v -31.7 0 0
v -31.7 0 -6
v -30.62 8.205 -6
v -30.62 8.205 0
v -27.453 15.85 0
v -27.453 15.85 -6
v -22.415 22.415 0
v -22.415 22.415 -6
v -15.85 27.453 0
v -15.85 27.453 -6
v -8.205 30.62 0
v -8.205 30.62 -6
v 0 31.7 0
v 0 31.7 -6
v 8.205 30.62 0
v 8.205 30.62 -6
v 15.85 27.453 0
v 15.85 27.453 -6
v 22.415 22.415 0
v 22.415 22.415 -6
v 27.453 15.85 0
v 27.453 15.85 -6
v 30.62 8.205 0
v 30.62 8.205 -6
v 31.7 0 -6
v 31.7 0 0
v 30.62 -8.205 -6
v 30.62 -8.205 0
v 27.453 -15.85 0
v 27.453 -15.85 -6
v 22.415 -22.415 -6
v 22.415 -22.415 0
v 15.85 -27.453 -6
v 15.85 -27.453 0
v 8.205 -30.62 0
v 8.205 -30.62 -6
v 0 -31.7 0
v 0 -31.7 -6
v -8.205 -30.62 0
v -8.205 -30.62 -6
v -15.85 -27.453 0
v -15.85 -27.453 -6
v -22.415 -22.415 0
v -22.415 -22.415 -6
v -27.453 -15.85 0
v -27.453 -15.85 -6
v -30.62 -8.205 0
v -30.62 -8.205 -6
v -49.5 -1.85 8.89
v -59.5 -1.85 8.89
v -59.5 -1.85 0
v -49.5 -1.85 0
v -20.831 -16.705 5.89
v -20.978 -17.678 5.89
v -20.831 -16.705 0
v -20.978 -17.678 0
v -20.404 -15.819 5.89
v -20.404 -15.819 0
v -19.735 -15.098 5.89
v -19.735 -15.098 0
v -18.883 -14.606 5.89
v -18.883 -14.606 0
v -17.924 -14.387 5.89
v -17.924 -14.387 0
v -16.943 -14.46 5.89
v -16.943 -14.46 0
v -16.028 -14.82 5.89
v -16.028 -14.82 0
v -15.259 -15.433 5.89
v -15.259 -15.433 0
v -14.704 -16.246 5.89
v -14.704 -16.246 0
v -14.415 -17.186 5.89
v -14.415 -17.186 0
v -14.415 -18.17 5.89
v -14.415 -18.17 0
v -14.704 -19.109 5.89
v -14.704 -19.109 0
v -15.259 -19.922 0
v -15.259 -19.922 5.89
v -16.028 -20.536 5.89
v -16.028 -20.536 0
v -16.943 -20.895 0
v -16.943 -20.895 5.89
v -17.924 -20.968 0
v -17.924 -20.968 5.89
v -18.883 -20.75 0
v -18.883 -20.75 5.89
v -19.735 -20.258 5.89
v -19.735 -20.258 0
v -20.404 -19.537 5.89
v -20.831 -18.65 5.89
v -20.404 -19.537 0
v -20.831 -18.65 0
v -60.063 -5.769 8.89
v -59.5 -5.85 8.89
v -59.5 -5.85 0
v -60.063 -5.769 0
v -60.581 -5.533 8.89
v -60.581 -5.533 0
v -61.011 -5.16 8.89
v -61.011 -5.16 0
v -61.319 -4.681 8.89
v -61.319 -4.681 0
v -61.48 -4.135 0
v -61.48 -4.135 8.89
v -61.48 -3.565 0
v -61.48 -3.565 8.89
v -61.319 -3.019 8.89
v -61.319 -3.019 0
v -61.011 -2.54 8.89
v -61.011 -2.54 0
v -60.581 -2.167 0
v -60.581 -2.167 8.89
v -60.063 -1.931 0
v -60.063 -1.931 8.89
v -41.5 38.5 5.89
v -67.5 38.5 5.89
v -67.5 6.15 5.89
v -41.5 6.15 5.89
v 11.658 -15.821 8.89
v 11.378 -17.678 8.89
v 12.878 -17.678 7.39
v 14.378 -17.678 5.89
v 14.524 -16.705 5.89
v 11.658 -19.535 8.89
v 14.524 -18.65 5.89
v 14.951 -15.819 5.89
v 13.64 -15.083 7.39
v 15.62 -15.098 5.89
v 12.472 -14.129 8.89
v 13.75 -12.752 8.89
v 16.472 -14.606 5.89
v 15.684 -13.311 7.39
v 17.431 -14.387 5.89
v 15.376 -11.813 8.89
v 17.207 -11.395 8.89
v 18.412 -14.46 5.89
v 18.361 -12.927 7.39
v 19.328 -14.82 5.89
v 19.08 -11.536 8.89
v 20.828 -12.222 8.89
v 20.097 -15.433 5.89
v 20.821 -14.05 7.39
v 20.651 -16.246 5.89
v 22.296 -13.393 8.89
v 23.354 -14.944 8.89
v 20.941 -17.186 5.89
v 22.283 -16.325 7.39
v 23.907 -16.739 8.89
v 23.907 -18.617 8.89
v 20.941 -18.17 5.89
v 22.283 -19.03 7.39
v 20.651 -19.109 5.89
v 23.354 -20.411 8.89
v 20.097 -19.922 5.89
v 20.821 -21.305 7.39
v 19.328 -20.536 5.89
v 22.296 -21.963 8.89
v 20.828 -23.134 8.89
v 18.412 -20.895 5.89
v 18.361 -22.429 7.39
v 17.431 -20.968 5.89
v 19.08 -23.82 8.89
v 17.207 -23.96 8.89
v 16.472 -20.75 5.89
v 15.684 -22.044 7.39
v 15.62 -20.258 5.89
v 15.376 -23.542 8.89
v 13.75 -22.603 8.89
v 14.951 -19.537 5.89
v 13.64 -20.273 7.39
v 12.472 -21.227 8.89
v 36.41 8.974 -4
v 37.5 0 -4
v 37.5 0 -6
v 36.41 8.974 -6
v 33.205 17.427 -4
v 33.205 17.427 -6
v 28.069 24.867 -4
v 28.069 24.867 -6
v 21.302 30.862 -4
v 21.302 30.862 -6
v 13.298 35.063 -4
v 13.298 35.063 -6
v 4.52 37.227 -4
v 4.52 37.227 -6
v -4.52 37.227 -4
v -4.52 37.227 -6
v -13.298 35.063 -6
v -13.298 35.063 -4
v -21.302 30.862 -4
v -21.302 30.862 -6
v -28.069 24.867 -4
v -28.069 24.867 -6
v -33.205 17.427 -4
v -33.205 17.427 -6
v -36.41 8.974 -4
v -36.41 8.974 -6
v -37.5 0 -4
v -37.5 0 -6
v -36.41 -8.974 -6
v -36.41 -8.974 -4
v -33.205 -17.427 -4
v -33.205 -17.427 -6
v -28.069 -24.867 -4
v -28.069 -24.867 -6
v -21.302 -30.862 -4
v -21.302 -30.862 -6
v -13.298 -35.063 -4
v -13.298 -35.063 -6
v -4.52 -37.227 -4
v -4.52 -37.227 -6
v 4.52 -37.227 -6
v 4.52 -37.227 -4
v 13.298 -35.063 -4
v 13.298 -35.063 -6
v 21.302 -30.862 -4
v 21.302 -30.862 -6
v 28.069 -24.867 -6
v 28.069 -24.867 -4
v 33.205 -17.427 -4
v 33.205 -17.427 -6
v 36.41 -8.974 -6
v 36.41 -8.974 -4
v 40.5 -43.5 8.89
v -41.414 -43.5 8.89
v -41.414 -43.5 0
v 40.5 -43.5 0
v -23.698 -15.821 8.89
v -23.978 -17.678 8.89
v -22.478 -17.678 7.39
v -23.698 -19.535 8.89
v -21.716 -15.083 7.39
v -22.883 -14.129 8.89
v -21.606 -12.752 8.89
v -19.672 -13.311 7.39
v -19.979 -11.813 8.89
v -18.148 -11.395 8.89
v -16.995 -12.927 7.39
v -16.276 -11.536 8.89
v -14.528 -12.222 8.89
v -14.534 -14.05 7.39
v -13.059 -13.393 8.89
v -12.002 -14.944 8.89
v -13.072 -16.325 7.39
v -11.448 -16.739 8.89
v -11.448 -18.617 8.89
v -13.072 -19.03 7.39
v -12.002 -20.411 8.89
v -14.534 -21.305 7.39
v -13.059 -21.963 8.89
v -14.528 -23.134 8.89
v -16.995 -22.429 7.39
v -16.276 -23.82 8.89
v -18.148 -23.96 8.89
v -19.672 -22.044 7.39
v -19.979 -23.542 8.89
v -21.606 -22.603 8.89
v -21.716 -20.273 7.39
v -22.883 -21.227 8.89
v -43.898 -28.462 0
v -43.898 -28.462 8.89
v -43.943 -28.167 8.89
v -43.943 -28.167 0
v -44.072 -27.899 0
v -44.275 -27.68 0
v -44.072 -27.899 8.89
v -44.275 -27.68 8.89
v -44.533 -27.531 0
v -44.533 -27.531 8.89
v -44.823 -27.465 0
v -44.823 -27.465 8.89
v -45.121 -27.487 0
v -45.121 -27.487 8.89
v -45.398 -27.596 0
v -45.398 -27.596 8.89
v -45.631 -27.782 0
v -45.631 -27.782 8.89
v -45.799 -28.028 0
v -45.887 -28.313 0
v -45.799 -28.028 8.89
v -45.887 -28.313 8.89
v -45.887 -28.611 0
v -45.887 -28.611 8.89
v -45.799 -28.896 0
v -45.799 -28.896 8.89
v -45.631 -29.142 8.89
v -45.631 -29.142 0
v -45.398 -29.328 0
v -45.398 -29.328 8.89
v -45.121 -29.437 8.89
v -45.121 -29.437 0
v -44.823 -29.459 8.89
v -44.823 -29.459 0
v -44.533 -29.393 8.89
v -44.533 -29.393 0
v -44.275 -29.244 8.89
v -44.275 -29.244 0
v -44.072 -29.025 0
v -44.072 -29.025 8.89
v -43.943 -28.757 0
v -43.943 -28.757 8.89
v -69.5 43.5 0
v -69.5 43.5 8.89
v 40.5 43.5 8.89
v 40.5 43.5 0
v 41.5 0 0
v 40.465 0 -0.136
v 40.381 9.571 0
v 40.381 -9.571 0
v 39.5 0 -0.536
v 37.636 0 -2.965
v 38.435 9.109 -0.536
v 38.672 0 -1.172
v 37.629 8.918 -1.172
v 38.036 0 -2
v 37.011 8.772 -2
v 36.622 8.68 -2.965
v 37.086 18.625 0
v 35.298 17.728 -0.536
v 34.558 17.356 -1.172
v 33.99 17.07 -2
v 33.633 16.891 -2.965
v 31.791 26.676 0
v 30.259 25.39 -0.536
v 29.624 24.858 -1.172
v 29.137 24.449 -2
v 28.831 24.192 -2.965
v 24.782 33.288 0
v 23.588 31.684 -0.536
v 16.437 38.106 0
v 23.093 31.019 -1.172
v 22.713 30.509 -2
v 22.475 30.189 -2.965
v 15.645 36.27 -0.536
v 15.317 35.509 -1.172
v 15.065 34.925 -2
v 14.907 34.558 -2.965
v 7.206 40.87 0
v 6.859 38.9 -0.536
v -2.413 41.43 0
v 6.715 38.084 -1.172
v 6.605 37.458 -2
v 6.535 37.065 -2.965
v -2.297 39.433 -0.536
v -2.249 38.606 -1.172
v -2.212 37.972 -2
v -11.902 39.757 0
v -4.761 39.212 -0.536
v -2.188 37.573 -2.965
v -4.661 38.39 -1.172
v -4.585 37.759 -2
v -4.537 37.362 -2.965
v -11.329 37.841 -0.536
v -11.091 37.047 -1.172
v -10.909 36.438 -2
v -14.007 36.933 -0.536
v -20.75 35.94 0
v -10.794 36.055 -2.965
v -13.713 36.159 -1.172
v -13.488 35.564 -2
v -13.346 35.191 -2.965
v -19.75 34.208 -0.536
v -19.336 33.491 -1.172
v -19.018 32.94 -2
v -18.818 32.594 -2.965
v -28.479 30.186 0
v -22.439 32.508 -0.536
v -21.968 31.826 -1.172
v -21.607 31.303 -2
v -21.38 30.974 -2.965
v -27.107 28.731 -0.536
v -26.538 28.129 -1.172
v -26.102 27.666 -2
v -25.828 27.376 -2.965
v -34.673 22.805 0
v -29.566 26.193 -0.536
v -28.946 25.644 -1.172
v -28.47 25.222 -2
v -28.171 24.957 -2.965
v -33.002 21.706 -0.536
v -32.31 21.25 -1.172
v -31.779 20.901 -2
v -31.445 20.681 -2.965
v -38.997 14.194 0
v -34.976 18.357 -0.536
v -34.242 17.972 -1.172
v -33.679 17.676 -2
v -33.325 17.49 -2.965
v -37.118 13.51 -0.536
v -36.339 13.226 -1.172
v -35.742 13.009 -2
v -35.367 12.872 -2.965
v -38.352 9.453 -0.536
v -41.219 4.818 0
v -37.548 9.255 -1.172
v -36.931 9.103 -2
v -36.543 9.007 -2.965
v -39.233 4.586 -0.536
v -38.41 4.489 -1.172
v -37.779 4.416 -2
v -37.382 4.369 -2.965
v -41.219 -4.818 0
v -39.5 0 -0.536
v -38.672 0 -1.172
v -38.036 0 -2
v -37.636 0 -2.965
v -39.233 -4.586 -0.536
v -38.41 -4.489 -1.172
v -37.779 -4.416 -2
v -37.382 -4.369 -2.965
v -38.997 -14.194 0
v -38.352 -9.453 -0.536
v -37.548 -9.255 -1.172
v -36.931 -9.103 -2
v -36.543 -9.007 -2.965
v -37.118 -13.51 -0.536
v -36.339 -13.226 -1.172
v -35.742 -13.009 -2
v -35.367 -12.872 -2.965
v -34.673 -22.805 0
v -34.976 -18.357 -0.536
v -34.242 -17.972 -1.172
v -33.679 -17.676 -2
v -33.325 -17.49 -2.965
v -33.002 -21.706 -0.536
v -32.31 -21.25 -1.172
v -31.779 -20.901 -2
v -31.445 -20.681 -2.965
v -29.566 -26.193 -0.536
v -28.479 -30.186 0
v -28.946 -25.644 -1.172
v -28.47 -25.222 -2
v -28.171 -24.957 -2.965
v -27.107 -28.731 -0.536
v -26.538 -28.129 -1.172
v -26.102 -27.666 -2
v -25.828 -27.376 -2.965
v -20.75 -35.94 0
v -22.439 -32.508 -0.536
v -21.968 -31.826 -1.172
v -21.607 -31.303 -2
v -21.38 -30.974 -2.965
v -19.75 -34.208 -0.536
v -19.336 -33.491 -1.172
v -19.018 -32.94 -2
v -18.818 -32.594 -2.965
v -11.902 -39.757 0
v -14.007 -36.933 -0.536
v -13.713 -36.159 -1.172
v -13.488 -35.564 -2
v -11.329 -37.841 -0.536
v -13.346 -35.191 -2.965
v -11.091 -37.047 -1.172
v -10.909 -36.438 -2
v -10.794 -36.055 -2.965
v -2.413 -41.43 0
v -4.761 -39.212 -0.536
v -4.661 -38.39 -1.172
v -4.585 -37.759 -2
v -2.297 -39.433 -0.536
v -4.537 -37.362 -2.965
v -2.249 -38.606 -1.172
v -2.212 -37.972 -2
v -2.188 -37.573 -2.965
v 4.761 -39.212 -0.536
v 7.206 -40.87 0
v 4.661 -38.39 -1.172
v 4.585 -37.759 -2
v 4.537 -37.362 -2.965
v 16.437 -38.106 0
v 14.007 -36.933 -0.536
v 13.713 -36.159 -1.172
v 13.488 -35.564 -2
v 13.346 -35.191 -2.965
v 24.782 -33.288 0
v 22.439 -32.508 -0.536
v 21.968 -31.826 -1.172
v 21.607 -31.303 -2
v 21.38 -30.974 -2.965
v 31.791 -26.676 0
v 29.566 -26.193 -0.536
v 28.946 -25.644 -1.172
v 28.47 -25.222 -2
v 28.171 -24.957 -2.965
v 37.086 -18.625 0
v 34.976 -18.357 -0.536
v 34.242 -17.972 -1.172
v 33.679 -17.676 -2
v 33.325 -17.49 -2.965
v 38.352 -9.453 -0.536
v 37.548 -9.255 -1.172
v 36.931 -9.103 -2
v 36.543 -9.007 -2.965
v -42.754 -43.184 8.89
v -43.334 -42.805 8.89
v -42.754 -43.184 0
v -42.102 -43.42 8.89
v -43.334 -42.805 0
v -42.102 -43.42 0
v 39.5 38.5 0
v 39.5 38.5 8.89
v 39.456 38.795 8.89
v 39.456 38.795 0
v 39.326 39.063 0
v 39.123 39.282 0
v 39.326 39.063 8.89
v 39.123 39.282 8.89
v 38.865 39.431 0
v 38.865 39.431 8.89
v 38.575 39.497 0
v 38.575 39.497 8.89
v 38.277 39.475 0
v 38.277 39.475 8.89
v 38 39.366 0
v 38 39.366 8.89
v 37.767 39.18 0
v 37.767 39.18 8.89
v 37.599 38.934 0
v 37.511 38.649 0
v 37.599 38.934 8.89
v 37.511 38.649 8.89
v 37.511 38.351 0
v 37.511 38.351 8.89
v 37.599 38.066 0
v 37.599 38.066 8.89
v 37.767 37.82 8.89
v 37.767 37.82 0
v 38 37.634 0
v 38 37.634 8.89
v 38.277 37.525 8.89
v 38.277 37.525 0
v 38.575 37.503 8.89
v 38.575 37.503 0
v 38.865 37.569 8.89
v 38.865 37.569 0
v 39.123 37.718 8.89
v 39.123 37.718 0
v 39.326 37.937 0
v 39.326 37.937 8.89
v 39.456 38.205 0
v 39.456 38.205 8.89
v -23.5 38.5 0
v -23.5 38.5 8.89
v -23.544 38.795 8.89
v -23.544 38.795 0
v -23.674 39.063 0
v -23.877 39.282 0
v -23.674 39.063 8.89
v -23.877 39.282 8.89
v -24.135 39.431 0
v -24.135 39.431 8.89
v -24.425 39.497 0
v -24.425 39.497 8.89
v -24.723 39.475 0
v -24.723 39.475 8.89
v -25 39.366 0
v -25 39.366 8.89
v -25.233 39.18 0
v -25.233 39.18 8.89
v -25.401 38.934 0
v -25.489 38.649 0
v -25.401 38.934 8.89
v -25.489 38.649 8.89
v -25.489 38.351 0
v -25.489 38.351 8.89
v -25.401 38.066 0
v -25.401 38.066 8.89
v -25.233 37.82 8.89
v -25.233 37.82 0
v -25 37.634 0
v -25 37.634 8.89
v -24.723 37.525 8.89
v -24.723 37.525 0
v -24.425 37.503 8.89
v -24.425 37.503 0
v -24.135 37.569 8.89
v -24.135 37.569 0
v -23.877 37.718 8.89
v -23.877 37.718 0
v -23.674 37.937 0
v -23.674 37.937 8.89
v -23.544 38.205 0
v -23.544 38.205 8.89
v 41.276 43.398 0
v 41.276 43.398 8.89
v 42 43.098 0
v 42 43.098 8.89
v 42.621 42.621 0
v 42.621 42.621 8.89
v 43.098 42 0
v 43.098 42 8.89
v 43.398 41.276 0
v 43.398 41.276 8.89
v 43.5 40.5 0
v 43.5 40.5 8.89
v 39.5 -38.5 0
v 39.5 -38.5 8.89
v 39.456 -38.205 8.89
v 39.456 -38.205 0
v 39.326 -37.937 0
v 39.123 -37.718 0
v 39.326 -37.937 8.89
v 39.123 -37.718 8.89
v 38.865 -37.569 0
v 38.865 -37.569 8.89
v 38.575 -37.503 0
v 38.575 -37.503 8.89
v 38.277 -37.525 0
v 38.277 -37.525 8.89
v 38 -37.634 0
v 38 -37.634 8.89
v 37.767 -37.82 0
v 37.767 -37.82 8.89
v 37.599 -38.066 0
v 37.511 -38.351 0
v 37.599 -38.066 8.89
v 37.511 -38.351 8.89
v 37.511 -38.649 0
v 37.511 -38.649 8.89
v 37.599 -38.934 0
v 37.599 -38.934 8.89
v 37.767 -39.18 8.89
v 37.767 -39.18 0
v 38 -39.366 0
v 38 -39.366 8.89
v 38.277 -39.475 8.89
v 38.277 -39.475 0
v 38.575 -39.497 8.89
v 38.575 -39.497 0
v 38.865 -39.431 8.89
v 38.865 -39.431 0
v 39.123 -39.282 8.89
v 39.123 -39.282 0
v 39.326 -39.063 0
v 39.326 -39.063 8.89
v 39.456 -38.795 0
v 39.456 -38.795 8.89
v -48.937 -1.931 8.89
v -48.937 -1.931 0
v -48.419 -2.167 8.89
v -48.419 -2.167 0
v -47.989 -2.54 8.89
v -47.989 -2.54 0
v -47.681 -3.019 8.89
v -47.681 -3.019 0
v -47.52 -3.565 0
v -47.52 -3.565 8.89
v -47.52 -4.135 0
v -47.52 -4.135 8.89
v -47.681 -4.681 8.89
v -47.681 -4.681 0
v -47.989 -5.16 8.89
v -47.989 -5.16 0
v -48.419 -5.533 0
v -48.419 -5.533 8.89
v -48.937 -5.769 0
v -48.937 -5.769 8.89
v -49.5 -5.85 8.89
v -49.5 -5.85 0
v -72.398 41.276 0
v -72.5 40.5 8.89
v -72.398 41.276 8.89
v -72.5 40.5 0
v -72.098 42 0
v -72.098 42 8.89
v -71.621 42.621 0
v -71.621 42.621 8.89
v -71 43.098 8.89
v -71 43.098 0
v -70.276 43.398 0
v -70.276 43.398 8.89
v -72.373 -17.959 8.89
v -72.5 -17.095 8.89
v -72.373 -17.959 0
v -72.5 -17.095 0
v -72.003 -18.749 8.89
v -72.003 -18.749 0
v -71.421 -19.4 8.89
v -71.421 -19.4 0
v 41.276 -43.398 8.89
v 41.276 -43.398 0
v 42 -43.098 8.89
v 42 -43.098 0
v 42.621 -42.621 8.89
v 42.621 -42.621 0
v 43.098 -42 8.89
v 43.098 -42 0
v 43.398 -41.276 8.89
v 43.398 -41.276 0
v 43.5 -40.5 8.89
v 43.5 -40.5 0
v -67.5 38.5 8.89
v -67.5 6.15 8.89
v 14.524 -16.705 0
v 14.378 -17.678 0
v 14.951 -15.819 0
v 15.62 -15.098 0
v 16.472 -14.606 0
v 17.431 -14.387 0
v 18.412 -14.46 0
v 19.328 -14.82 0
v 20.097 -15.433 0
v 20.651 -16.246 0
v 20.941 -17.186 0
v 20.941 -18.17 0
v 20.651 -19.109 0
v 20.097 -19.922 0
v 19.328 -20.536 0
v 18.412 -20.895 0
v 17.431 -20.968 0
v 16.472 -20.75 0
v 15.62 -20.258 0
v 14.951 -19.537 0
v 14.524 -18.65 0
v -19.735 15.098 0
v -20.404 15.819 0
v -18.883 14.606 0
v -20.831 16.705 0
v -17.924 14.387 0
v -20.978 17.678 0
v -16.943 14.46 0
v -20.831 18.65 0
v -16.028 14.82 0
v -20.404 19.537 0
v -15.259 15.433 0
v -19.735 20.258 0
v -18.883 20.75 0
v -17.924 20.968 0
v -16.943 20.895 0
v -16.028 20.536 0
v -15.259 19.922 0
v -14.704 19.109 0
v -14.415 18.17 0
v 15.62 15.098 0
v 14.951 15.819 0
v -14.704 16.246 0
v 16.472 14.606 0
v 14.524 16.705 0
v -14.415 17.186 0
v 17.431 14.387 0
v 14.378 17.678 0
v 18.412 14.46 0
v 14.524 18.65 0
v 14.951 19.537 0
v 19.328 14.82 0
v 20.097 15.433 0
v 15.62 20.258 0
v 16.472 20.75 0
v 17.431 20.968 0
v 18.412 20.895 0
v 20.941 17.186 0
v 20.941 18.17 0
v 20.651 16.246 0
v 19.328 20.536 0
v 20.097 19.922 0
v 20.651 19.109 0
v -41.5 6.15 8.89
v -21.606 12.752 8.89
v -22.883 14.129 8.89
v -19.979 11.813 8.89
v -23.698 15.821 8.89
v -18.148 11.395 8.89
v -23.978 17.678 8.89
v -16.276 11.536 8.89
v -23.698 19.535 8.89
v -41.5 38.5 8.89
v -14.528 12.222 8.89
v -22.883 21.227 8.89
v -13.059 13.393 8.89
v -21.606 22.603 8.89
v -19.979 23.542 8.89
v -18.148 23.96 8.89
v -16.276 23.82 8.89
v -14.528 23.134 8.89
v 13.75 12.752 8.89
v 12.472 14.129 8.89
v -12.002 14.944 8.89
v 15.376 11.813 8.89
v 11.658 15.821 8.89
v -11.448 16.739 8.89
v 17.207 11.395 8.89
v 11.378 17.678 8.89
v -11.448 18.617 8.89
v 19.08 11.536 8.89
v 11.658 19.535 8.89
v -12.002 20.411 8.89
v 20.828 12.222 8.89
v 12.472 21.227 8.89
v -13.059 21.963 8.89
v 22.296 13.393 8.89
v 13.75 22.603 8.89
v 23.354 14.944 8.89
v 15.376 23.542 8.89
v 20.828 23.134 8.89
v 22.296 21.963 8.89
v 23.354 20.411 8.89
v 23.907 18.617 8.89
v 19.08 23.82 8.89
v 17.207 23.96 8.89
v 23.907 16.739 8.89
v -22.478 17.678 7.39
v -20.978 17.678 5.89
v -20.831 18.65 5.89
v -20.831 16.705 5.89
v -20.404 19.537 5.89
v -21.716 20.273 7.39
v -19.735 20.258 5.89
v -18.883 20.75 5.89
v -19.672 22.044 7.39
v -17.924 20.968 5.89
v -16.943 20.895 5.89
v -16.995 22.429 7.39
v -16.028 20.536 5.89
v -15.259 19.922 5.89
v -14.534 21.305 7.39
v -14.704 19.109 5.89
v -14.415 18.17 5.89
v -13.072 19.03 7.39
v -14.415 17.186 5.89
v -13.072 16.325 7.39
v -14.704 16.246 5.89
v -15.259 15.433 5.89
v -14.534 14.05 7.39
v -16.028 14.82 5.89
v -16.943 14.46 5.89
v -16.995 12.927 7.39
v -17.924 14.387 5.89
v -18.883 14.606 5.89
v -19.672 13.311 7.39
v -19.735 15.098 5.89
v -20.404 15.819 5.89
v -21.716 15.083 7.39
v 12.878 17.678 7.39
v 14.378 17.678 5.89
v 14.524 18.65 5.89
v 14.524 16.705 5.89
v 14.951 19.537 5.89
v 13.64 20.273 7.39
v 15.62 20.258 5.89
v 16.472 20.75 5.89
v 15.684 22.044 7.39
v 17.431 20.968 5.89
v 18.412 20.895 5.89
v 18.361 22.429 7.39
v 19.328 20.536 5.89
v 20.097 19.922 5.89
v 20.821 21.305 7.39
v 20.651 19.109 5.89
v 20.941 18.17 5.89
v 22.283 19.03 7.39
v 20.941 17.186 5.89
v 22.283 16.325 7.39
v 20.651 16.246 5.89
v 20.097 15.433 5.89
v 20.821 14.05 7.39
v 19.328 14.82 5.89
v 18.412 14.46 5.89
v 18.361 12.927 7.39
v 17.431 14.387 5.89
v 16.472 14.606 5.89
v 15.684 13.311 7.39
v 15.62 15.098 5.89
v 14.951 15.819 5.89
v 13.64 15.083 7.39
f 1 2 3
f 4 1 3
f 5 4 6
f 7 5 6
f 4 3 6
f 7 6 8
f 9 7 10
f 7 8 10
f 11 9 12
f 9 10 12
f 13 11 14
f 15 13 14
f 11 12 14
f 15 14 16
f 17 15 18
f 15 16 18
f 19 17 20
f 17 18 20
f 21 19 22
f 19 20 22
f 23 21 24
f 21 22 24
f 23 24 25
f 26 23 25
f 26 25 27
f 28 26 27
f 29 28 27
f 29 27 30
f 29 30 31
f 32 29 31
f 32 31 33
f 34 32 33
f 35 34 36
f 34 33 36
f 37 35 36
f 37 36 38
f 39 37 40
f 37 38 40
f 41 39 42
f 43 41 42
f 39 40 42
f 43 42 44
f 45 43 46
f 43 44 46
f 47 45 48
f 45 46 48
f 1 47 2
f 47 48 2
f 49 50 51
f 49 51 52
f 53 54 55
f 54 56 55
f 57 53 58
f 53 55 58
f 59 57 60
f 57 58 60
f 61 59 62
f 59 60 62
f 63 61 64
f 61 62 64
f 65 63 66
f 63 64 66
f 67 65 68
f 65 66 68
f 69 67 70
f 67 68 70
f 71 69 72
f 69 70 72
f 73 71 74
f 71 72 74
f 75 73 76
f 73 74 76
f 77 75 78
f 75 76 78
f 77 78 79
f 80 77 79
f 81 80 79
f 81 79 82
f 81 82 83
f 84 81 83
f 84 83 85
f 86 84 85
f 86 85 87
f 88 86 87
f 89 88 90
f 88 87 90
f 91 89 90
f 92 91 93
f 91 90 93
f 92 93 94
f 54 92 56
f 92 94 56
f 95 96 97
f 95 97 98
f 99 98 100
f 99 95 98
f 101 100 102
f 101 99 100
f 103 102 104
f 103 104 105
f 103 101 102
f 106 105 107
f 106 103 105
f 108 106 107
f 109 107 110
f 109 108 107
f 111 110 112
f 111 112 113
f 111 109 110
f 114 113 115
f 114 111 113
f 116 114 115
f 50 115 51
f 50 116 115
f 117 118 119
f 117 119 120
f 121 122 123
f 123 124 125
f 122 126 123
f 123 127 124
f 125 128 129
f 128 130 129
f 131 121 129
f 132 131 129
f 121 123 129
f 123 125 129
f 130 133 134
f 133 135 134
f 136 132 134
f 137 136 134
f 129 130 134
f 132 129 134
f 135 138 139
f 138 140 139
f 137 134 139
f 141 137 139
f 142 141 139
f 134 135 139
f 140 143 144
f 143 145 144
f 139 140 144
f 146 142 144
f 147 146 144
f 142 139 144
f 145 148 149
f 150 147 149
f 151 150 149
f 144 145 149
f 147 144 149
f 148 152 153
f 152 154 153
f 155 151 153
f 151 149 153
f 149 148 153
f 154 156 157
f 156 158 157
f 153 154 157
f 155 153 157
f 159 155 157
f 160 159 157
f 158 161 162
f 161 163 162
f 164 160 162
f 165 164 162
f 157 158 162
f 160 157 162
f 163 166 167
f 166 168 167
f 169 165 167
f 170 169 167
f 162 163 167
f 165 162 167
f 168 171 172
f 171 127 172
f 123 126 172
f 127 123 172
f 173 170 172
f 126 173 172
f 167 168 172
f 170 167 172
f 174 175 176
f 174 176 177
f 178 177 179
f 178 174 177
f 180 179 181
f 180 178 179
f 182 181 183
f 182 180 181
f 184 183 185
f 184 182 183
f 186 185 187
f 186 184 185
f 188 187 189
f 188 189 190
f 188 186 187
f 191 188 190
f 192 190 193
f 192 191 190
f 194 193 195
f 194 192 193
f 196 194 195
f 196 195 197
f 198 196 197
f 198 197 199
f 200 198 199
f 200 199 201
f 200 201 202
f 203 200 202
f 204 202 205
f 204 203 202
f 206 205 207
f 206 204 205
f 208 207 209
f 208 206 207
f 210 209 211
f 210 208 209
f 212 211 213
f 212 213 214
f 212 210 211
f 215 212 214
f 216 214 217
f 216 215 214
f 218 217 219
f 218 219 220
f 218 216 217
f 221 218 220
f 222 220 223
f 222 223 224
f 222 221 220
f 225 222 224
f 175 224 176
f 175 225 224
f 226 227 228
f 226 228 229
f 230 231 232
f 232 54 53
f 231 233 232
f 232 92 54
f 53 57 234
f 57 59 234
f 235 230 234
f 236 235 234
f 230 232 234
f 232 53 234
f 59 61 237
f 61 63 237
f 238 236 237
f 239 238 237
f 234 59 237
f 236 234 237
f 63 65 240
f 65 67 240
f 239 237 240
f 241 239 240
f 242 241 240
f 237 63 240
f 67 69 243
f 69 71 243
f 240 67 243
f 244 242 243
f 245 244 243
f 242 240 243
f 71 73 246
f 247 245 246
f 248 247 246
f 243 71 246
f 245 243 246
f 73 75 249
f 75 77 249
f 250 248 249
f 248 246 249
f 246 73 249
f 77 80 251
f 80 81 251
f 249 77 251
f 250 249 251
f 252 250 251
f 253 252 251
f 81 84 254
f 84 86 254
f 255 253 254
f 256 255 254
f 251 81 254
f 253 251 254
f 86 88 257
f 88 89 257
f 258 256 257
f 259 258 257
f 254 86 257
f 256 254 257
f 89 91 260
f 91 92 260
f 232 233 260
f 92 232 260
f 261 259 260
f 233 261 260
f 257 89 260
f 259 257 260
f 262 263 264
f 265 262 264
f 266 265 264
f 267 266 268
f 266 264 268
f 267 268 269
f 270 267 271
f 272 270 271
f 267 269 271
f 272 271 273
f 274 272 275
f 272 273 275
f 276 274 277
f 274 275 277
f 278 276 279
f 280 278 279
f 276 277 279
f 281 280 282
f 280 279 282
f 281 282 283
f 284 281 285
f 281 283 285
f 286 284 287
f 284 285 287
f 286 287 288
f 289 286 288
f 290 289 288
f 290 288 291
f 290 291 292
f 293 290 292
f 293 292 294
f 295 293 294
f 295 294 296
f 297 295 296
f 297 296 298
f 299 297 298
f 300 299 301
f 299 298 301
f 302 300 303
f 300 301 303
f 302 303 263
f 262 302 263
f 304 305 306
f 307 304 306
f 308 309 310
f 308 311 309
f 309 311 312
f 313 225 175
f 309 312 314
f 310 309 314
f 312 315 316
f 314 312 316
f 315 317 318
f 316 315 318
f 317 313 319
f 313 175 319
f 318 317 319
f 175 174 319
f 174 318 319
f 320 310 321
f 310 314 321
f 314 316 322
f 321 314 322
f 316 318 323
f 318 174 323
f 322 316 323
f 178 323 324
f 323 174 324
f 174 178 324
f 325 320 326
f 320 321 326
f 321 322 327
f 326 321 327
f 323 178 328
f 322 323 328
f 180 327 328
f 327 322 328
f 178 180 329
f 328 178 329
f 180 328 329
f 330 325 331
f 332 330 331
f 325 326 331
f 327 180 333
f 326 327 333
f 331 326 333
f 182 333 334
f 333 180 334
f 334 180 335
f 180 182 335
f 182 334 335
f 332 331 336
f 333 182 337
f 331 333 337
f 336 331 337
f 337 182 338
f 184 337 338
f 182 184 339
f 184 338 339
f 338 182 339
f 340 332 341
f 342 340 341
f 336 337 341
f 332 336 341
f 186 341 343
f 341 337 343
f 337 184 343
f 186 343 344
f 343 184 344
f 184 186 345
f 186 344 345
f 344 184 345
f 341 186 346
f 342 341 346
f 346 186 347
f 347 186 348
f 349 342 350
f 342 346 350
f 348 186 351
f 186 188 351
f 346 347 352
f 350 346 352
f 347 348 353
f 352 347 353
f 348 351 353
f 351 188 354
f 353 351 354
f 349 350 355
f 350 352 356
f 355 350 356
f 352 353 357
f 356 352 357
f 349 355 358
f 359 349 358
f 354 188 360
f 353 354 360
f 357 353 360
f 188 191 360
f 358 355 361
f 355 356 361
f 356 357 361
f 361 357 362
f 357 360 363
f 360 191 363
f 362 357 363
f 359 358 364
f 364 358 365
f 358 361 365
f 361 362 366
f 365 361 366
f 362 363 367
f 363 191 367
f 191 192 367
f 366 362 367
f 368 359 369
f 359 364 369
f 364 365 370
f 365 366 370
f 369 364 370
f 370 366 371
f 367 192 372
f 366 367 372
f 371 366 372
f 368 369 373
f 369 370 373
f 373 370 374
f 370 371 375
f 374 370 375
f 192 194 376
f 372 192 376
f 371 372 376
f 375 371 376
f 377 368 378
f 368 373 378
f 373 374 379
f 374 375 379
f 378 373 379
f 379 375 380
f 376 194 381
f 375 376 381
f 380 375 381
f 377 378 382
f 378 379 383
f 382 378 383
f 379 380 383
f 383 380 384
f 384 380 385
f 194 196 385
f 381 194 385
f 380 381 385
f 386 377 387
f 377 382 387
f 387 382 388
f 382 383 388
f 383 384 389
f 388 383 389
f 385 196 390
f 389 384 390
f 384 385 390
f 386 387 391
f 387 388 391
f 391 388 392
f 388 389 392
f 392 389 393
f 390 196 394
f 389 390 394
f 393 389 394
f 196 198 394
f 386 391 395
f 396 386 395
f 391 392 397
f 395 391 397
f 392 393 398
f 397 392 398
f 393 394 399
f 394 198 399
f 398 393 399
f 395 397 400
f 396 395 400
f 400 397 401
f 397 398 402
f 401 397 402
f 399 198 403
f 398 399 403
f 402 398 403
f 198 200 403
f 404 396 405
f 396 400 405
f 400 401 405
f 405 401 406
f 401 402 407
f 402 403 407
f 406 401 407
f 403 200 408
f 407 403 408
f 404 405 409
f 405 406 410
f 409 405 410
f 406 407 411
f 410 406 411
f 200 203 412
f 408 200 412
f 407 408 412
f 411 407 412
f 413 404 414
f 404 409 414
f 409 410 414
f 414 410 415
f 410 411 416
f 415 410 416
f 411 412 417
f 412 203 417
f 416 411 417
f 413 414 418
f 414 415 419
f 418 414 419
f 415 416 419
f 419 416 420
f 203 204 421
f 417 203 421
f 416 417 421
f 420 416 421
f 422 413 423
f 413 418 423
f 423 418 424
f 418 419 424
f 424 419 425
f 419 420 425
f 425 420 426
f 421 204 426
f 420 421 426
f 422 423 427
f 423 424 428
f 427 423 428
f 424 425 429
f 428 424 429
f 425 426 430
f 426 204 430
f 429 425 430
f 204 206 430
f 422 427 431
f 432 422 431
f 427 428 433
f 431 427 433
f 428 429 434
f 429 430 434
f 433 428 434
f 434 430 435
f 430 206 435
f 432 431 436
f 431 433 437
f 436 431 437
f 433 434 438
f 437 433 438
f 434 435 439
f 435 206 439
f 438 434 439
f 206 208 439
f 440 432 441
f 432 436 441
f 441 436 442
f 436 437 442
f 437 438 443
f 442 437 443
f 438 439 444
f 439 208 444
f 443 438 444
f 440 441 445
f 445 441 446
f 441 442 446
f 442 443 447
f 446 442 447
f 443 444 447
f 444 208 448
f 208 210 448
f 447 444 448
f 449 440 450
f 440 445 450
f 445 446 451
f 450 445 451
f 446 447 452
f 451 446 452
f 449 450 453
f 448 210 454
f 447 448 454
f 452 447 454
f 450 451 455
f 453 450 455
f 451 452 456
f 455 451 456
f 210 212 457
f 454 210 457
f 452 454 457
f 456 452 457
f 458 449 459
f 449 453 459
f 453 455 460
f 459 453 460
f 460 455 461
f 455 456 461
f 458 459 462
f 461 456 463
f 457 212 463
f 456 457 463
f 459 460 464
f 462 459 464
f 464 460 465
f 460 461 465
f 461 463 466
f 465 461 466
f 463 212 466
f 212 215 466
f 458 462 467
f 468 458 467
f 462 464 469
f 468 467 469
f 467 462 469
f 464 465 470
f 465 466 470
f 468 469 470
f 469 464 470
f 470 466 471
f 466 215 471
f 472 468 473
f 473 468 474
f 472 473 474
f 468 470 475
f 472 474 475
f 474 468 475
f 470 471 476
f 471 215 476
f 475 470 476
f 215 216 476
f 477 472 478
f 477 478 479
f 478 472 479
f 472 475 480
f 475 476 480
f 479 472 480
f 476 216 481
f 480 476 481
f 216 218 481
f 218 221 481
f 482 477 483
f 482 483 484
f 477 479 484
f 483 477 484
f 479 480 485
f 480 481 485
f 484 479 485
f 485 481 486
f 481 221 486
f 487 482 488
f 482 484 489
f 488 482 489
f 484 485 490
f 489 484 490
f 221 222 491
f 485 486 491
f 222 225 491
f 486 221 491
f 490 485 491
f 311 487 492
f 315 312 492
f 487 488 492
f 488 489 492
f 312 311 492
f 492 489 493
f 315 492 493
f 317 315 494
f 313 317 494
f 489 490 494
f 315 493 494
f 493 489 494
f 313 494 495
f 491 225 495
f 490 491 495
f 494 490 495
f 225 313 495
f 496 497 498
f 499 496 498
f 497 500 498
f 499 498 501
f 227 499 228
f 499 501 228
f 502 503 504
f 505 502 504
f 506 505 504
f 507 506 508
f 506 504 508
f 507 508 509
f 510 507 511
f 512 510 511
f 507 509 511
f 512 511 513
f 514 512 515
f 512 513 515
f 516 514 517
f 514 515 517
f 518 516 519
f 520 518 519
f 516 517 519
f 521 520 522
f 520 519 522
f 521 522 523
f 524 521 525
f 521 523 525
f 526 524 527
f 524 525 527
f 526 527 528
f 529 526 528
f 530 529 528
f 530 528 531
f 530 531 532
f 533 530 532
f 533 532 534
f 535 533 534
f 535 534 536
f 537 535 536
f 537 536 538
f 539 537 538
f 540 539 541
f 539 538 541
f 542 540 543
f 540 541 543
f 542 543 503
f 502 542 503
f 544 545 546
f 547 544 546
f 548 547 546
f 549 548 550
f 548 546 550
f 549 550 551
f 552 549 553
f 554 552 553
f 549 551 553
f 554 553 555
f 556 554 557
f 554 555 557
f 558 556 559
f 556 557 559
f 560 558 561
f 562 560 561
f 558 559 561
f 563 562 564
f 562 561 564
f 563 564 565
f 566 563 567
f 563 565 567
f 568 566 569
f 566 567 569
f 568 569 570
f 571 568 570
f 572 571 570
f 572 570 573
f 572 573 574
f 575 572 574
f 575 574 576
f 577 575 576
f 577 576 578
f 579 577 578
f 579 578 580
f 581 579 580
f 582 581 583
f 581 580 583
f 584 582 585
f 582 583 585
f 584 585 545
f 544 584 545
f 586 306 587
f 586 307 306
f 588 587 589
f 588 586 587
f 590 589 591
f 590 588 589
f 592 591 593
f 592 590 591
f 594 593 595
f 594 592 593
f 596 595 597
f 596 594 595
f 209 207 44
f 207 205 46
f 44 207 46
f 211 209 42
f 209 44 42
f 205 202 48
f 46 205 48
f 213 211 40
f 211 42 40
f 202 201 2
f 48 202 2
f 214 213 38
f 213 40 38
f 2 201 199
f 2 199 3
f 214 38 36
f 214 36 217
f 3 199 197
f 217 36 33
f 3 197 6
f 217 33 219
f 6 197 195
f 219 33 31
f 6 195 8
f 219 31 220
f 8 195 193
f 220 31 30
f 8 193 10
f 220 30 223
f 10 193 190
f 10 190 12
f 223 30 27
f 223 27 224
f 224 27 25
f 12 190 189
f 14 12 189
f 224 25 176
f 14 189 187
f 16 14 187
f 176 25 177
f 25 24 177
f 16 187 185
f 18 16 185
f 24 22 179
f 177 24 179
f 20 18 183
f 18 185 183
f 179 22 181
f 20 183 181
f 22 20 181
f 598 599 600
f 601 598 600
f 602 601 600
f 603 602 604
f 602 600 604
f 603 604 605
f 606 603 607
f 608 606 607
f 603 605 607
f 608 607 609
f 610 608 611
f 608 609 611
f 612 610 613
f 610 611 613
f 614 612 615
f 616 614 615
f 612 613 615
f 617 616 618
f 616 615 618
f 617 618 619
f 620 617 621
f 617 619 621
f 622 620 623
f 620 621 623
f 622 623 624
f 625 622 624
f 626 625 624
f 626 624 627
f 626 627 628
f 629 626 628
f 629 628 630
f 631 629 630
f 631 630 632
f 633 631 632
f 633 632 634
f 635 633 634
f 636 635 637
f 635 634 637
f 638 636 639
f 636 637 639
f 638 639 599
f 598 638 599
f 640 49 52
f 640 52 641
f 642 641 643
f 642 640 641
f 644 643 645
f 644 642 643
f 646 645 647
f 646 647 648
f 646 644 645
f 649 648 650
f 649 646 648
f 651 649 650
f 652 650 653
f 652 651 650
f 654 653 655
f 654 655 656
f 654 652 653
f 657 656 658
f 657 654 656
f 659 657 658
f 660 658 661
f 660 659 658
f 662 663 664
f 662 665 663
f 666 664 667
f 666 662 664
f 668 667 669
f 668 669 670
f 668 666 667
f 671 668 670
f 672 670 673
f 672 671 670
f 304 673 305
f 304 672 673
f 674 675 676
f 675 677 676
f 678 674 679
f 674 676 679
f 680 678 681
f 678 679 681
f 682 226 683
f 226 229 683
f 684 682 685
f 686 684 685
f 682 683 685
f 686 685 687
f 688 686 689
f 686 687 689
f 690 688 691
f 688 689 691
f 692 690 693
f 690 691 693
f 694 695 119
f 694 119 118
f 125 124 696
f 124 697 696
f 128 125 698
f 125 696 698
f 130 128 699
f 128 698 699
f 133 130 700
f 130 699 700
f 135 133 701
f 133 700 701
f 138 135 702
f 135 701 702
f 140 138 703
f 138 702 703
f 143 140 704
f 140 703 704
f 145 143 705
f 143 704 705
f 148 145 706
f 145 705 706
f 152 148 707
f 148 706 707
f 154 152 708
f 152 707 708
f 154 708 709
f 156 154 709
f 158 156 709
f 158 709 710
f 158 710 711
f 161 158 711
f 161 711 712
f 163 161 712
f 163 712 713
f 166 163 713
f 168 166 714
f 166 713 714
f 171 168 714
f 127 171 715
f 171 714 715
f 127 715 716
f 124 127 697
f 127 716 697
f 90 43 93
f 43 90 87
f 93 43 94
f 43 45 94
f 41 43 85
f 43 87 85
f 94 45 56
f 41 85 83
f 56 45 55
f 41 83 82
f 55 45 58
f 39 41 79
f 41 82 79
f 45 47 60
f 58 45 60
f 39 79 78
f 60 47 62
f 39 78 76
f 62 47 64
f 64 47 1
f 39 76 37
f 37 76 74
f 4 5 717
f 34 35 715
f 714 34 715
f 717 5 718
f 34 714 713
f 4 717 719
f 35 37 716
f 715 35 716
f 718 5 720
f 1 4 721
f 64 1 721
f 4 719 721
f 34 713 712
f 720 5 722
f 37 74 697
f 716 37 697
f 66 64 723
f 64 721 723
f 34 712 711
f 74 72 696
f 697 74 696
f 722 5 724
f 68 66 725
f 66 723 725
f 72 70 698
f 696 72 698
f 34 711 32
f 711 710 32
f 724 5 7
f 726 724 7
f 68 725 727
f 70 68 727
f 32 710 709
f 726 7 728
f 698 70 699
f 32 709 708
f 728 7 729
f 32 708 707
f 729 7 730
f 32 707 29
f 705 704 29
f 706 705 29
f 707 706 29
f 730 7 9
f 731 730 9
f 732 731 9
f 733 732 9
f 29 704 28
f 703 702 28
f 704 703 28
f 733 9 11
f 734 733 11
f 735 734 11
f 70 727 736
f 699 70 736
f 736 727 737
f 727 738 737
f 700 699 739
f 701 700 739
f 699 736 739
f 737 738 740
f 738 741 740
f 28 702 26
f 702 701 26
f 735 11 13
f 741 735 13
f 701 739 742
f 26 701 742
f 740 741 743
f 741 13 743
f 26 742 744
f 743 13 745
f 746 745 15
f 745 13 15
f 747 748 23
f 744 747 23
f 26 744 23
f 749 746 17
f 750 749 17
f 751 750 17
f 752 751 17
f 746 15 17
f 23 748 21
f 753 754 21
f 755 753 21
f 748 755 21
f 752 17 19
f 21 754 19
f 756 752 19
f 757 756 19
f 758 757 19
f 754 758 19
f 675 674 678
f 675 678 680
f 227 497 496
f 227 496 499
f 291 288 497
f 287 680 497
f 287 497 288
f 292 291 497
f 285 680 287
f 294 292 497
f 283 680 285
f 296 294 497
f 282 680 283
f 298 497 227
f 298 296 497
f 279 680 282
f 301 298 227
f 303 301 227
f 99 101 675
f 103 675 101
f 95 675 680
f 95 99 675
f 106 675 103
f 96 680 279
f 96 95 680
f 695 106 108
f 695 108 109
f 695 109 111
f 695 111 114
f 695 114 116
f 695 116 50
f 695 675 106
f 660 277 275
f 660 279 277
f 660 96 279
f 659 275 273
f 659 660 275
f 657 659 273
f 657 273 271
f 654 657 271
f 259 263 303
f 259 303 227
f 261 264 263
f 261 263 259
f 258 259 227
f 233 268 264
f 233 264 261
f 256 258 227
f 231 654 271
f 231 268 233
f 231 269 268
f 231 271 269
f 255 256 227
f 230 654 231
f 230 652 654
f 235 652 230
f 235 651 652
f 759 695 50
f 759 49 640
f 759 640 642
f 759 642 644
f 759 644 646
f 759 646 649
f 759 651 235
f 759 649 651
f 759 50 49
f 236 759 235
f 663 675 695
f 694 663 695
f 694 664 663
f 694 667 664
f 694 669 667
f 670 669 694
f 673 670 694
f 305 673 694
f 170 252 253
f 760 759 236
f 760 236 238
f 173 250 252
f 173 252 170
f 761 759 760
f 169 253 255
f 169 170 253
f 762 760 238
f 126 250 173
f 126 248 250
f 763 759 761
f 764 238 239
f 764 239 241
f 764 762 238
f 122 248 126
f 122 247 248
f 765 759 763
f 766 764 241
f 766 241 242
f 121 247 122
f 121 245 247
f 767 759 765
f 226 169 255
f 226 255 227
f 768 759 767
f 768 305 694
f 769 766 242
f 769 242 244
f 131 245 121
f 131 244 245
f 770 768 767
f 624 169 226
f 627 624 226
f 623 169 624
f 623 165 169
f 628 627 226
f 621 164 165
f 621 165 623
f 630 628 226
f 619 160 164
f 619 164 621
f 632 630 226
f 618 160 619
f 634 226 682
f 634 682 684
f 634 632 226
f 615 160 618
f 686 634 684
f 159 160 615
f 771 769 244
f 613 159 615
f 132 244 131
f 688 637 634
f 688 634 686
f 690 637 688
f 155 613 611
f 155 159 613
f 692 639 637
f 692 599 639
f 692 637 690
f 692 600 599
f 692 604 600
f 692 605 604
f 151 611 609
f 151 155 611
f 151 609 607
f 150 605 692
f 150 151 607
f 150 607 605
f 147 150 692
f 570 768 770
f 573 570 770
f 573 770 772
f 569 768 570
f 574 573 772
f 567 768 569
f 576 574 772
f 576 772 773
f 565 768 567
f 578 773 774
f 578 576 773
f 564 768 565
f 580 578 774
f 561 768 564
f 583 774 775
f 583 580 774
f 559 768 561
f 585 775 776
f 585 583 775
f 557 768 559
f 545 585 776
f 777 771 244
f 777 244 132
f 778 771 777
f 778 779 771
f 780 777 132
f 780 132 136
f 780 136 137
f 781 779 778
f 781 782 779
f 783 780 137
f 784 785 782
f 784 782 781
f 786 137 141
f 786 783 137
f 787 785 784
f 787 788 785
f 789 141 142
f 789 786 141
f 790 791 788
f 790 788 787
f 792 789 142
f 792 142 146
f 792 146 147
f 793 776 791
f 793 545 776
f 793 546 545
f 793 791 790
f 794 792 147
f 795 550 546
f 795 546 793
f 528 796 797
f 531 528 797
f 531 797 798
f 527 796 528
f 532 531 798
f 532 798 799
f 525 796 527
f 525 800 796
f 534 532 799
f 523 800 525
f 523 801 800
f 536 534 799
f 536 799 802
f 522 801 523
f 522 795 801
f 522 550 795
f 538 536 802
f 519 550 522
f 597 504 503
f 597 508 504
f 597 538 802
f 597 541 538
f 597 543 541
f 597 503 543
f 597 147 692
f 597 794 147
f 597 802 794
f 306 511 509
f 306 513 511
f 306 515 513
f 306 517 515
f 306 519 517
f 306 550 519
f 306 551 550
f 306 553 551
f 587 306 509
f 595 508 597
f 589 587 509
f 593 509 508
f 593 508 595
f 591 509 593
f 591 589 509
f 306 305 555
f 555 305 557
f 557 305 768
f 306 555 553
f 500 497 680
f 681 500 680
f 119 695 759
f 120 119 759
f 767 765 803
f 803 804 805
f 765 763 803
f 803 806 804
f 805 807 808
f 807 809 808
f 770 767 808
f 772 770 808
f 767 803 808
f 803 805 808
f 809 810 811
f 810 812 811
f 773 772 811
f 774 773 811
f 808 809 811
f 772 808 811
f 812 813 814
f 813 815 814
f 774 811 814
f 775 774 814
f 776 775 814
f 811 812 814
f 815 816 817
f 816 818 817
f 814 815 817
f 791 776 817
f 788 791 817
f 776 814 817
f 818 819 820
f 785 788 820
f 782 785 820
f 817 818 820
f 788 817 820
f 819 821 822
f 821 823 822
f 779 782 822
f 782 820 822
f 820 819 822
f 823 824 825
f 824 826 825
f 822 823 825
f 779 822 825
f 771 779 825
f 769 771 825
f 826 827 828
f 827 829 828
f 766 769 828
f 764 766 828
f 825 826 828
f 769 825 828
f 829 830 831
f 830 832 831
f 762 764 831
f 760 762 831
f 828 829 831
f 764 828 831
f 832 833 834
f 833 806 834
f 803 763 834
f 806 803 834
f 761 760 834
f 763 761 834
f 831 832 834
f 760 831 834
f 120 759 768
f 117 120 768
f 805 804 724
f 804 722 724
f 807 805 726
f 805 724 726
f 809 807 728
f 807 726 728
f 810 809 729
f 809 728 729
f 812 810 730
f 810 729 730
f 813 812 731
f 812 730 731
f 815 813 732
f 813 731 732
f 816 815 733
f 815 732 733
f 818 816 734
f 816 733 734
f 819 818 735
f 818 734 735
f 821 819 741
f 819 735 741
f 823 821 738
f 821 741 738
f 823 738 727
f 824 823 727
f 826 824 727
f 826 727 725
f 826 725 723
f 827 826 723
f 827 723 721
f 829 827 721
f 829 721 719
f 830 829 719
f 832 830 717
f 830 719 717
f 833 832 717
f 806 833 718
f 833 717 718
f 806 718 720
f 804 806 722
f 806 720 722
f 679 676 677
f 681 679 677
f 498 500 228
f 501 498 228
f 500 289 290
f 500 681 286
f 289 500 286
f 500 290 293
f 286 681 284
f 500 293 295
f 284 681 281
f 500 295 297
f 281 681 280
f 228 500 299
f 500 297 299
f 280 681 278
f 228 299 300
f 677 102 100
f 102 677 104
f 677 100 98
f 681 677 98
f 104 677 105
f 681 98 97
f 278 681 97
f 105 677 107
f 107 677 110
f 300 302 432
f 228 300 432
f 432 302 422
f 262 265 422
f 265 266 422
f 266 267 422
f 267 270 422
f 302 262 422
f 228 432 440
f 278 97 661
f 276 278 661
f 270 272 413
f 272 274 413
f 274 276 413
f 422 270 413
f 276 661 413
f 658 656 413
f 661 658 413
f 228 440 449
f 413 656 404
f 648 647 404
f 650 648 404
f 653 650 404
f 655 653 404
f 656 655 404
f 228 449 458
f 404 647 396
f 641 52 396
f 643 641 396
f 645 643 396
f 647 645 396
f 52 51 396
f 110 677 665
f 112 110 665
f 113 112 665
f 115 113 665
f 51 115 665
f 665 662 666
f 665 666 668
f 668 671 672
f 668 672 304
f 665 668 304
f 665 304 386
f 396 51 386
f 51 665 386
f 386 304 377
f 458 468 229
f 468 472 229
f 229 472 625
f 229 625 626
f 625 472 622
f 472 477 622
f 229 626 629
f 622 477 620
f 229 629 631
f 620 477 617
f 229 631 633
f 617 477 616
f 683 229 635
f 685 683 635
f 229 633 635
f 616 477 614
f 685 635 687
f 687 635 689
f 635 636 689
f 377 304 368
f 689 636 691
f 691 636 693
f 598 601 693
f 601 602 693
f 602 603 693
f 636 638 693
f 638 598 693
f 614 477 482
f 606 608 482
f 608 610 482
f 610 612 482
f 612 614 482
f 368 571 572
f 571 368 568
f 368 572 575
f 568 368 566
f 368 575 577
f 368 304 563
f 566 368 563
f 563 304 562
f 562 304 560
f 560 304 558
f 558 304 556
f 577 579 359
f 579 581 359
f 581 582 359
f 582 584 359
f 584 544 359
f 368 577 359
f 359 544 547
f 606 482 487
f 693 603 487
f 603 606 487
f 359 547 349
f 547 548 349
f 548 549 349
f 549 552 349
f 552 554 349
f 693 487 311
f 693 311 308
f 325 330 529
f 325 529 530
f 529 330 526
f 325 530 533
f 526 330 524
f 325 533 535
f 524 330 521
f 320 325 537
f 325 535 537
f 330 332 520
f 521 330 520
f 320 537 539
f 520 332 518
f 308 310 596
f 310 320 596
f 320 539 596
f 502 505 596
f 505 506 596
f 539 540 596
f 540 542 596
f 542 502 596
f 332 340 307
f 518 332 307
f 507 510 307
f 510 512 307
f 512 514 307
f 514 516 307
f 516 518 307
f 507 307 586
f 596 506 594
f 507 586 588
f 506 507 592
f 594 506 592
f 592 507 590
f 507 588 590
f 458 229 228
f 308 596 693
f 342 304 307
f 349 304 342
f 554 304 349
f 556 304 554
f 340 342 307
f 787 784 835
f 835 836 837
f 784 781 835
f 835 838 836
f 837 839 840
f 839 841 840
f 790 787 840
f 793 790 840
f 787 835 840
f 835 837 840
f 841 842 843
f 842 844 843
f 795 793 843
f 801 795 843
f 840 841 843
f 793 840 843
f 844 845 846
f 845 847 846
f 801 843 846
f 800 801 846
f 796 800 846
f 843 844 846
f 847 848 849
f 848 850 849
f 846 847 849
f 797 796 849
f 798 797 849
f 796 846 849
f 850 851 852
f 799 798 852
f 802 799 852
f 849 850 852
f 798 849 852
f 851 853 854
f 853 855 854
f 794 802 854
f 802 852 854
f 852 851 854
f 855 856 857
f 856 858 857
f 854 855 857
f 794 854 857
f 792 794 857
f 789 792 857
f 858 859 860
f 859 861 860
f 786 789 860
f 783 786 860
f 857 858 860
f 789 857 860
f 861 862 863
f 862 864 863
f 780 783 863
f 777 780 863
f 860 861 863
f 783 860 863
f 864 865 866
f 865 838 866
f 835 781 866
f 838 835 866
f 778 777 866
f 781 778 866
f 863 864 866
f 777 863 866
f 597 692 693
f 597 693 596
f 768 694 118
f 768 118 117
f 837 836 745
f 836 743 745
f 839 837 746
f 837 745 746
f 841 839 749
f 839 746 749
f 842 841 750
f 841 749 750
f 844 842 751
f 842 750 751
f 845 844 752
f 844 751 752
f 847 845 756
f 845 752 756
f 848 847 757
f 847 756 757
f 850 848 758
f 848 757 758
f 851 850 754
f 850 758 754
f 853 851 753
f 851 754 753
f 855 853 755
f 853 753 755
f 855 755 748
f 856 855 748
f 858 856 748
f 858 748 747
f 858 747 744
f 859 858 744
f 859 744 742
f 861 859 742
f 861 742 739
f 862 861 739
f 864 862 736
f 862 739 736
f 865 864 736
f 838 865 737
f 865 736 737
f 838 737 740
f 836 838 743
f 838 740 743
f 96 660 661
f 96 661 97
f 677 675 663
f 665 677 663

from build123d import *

# Parameters (mm, degrees)
SKETCH1_R                                       = 37.5
BOSS_EXTRUDE1_DEPTH                             = 6
SKETCH2_R                                       = 31.7
CUT_EXTRUDE1_DEPTH                              = 6
SKETCH3_W                                       = 85
SKETCH3_H                                       = 85
BOSS_EXTRUDE2_DEPTH                             = 25.4
FILLET2_R                                       = 4
SKETCH4_W                                       = 65
SKETCH4_H                                       = 65
CUT_EXTRUDE2_DEPTH                              = 16.51
CSK_FOR_M6_FLAT_HEAD_MACHINE_SCREW1_D           = 6.6
CSK_FOR_M6_FLAT_HEAD_MACHINE_SCREW1_CSINK_D     = 12.6
CSK_FOR_M6_FLAT_HEAD_MACHINE_SCREW1_CSINK_ANGLE = 90
SKETCH8_W                                       = 85
SKETCH8_H                                       = 85
CUT_EXTRUDE3_DEPTH                              = 16.51
SKETCH9_W                                       = 116
SKETCH9_H                                       = 87
SKETCH9_W_2                                     = 85
SKETCH9_H_2                                     = 85
BOSS_EXTRUDE3_DEPTH                             = 8.89
CUT_EXTRUDE4_DEPTH                              = 8.89
SKETCH11_W                                      = 26
SKETCH11_H                                      = 32.35
CUT_EXTRUDE5_DEPTH                              = 3
CUT_EXTRUDE6_DEPTH                              = 8.89
SKETCH14_R                                      = 1
CUT_EXTRUDE7_DEPTH                              = 8.89
FILLET3_R                                       = 3


with BuildPart() as part:
    # Sketch1 → Boss-Extrude1 (new body)
    with BuildSketch(Plane.XY):
        Circle(SKETCH1_R)
    extrude(amount=-BOSS_EXTRUDE1_DEPTH)

    # Sketch2 → Cut-Extrude1 (cut)
    with BuildSketch(Plane(origin=(0, 0, -6), x_dir=(-1, 0, 0), z_dir=(0, 0, -1))):
        Circle(SKETCH2_R)
    extrude(amount=-CUT_EXTRUDE1_DEPTH, mode=Mode.SUBTRACT)

    # Sketch3 → Boss-Extrude2 (add)
    with BuildSketch(Plane.XY):
        Rectangle(SKETCH3_W, SKETCH3_H)
    extrude(amount=BOSS_EXTRUDE2_DEPTH)

    # Fillet2
    fillet2_edges = [part.edges().sort_by_distance(p)[0] for p in [
        (-37.5, 0, 0),
    ]]
    fillet(fillet2_edges, radius=FILLET2_R)

    # Sketch4 → Cut-Extrude2 (cut)
    with BuildSketch(Plane.XY.offset(25.4)):
        Rectangle(SKETCH4_W, SKETCH4_H)
    extrude(amount=-CUT_EXTRUDE2_DEPTH, mode=Mode.SUBTRACT)

    # CSK for M6 Flat Head Machine Screw1 (through all)
    with Locations(Plane.XY.offset(8.89)):
        with Locations((-17.67766953, 17.67766953), (-17.67766953, -17.67766953), (17.67766953, -17.67766953), (17.67766953, 17.67766953)):
            CounterSinkHole(CSK_FOR_M6_FLAT_HEAD_MACHINE_SCREW1_D / 2, CSK_FOR_M6_FLAT_HEAD_MACHINE_SCREW1_CSINK_D / 2, counter_sink_angle=CSK_FOR_M6_FLAT_HEAD_MACHINE_SCREW1_CSINK_ANGLE)

    # Sketch8 → Cut-Extrude3 (cut)
    with BuildSketch(Plane.XY.offset(25.4)):
        Rectangle(SKETCH8_W, SKETCH8_H)
    extrude(amount=-CUT_EXTRUDE3_DEPTH, mode=Mode.SUBTRACT)

    # Sketch9 → Boss-Extrude3 (add)
    with BuildSketch(Plane.XY.offset(8.89)):
        with Locations((-14.5, 0)):
            Rectangle(SKETCH9_W, SKETCH9_H)
        Rectangle(SKETCH9_W_2, SKETCH9_H_2, mode=Mode.SUBTRACT)
    extrude(amount=-BOSS_EXTRUDE3_DEPTH)

    # Sketch12 → Cut-Extrude4 (cut)
    with BuildSketch(Plane.XY.offset(8.89)):
        Polygon((-42.5, -43.5), (-72.5, -18.5), (-72.5, -43.5), align=None)
    extrude(amount=-CUT_EXTRUDE4_DEPTH, mode=Mode.SUBTRACT)

    # Sketch11 → Cut-Extrude5 (cut)
    with BuildSketch(Plane.XY.offset(8.89)):
        with Locations((-54.5, 22.325)):
            Rectangle(SKETCH11_W, SKETCH11_H)
    extrude(amount=-CUT_EXTRUDE5_DEPTH, mode=Mode.SUBTRACT)

    # Sketch13 → Cut-Extrude6 (cut)
    with BuildSketch(Plane.XY.offset(8.89)):
        with BuildLine():
            Line((-49.5, -5.85), (-59.5, -5.85))
            ThreePointArc((-59.5, -5.85), (-61.5, -3.85), (-59.5, -1.85))
            Line((-59.5, -1.85), (-49.5, -1.85))
            ThreePointArc((-49.5, -1.85), (-47.5, -3.85), (-49.5, -5.85))
        make_face()
    extrude(amount=-CUT_EXTRUDE6_DEPTH, mode=Mode.SUBTRACT)

    # Sketch14 → Cut-Extrude7 (cut)
    with BuildSketch(Plane.XY.offset(8.89)):
        with Locations((38.5, -38.5)):
            Circle(SKETCH14_R)
        with Locations((38.5, 38.5)):
            Circle(SKETCH14_R)
        with Locations((-24.5, 38.5)):
            Circle(SKETCH14_R)
        with Locations((-44.898080814, -28.46206612)):
            Circle(SKETCH14_R)
    extrude(amount=-CUT_EXTRUDE7_DEPTH, mode=Mode.SUBTRACT)

    # Fillet3
    fillet3_edges = [part.edges().sort_by_distance(p)[0] for p in [
        (43.5, 43.5, 4.445),
        (43.5, -43.5, 4.445),
        (-72.5, 43.5, 4.445),
        (-72.5, -18.5, 4.445),
        (-42.5, -43.5, 4.445),
    ]]
    fillet(fillet3_edges, radius=FILLET3_R)


solid = part.part
